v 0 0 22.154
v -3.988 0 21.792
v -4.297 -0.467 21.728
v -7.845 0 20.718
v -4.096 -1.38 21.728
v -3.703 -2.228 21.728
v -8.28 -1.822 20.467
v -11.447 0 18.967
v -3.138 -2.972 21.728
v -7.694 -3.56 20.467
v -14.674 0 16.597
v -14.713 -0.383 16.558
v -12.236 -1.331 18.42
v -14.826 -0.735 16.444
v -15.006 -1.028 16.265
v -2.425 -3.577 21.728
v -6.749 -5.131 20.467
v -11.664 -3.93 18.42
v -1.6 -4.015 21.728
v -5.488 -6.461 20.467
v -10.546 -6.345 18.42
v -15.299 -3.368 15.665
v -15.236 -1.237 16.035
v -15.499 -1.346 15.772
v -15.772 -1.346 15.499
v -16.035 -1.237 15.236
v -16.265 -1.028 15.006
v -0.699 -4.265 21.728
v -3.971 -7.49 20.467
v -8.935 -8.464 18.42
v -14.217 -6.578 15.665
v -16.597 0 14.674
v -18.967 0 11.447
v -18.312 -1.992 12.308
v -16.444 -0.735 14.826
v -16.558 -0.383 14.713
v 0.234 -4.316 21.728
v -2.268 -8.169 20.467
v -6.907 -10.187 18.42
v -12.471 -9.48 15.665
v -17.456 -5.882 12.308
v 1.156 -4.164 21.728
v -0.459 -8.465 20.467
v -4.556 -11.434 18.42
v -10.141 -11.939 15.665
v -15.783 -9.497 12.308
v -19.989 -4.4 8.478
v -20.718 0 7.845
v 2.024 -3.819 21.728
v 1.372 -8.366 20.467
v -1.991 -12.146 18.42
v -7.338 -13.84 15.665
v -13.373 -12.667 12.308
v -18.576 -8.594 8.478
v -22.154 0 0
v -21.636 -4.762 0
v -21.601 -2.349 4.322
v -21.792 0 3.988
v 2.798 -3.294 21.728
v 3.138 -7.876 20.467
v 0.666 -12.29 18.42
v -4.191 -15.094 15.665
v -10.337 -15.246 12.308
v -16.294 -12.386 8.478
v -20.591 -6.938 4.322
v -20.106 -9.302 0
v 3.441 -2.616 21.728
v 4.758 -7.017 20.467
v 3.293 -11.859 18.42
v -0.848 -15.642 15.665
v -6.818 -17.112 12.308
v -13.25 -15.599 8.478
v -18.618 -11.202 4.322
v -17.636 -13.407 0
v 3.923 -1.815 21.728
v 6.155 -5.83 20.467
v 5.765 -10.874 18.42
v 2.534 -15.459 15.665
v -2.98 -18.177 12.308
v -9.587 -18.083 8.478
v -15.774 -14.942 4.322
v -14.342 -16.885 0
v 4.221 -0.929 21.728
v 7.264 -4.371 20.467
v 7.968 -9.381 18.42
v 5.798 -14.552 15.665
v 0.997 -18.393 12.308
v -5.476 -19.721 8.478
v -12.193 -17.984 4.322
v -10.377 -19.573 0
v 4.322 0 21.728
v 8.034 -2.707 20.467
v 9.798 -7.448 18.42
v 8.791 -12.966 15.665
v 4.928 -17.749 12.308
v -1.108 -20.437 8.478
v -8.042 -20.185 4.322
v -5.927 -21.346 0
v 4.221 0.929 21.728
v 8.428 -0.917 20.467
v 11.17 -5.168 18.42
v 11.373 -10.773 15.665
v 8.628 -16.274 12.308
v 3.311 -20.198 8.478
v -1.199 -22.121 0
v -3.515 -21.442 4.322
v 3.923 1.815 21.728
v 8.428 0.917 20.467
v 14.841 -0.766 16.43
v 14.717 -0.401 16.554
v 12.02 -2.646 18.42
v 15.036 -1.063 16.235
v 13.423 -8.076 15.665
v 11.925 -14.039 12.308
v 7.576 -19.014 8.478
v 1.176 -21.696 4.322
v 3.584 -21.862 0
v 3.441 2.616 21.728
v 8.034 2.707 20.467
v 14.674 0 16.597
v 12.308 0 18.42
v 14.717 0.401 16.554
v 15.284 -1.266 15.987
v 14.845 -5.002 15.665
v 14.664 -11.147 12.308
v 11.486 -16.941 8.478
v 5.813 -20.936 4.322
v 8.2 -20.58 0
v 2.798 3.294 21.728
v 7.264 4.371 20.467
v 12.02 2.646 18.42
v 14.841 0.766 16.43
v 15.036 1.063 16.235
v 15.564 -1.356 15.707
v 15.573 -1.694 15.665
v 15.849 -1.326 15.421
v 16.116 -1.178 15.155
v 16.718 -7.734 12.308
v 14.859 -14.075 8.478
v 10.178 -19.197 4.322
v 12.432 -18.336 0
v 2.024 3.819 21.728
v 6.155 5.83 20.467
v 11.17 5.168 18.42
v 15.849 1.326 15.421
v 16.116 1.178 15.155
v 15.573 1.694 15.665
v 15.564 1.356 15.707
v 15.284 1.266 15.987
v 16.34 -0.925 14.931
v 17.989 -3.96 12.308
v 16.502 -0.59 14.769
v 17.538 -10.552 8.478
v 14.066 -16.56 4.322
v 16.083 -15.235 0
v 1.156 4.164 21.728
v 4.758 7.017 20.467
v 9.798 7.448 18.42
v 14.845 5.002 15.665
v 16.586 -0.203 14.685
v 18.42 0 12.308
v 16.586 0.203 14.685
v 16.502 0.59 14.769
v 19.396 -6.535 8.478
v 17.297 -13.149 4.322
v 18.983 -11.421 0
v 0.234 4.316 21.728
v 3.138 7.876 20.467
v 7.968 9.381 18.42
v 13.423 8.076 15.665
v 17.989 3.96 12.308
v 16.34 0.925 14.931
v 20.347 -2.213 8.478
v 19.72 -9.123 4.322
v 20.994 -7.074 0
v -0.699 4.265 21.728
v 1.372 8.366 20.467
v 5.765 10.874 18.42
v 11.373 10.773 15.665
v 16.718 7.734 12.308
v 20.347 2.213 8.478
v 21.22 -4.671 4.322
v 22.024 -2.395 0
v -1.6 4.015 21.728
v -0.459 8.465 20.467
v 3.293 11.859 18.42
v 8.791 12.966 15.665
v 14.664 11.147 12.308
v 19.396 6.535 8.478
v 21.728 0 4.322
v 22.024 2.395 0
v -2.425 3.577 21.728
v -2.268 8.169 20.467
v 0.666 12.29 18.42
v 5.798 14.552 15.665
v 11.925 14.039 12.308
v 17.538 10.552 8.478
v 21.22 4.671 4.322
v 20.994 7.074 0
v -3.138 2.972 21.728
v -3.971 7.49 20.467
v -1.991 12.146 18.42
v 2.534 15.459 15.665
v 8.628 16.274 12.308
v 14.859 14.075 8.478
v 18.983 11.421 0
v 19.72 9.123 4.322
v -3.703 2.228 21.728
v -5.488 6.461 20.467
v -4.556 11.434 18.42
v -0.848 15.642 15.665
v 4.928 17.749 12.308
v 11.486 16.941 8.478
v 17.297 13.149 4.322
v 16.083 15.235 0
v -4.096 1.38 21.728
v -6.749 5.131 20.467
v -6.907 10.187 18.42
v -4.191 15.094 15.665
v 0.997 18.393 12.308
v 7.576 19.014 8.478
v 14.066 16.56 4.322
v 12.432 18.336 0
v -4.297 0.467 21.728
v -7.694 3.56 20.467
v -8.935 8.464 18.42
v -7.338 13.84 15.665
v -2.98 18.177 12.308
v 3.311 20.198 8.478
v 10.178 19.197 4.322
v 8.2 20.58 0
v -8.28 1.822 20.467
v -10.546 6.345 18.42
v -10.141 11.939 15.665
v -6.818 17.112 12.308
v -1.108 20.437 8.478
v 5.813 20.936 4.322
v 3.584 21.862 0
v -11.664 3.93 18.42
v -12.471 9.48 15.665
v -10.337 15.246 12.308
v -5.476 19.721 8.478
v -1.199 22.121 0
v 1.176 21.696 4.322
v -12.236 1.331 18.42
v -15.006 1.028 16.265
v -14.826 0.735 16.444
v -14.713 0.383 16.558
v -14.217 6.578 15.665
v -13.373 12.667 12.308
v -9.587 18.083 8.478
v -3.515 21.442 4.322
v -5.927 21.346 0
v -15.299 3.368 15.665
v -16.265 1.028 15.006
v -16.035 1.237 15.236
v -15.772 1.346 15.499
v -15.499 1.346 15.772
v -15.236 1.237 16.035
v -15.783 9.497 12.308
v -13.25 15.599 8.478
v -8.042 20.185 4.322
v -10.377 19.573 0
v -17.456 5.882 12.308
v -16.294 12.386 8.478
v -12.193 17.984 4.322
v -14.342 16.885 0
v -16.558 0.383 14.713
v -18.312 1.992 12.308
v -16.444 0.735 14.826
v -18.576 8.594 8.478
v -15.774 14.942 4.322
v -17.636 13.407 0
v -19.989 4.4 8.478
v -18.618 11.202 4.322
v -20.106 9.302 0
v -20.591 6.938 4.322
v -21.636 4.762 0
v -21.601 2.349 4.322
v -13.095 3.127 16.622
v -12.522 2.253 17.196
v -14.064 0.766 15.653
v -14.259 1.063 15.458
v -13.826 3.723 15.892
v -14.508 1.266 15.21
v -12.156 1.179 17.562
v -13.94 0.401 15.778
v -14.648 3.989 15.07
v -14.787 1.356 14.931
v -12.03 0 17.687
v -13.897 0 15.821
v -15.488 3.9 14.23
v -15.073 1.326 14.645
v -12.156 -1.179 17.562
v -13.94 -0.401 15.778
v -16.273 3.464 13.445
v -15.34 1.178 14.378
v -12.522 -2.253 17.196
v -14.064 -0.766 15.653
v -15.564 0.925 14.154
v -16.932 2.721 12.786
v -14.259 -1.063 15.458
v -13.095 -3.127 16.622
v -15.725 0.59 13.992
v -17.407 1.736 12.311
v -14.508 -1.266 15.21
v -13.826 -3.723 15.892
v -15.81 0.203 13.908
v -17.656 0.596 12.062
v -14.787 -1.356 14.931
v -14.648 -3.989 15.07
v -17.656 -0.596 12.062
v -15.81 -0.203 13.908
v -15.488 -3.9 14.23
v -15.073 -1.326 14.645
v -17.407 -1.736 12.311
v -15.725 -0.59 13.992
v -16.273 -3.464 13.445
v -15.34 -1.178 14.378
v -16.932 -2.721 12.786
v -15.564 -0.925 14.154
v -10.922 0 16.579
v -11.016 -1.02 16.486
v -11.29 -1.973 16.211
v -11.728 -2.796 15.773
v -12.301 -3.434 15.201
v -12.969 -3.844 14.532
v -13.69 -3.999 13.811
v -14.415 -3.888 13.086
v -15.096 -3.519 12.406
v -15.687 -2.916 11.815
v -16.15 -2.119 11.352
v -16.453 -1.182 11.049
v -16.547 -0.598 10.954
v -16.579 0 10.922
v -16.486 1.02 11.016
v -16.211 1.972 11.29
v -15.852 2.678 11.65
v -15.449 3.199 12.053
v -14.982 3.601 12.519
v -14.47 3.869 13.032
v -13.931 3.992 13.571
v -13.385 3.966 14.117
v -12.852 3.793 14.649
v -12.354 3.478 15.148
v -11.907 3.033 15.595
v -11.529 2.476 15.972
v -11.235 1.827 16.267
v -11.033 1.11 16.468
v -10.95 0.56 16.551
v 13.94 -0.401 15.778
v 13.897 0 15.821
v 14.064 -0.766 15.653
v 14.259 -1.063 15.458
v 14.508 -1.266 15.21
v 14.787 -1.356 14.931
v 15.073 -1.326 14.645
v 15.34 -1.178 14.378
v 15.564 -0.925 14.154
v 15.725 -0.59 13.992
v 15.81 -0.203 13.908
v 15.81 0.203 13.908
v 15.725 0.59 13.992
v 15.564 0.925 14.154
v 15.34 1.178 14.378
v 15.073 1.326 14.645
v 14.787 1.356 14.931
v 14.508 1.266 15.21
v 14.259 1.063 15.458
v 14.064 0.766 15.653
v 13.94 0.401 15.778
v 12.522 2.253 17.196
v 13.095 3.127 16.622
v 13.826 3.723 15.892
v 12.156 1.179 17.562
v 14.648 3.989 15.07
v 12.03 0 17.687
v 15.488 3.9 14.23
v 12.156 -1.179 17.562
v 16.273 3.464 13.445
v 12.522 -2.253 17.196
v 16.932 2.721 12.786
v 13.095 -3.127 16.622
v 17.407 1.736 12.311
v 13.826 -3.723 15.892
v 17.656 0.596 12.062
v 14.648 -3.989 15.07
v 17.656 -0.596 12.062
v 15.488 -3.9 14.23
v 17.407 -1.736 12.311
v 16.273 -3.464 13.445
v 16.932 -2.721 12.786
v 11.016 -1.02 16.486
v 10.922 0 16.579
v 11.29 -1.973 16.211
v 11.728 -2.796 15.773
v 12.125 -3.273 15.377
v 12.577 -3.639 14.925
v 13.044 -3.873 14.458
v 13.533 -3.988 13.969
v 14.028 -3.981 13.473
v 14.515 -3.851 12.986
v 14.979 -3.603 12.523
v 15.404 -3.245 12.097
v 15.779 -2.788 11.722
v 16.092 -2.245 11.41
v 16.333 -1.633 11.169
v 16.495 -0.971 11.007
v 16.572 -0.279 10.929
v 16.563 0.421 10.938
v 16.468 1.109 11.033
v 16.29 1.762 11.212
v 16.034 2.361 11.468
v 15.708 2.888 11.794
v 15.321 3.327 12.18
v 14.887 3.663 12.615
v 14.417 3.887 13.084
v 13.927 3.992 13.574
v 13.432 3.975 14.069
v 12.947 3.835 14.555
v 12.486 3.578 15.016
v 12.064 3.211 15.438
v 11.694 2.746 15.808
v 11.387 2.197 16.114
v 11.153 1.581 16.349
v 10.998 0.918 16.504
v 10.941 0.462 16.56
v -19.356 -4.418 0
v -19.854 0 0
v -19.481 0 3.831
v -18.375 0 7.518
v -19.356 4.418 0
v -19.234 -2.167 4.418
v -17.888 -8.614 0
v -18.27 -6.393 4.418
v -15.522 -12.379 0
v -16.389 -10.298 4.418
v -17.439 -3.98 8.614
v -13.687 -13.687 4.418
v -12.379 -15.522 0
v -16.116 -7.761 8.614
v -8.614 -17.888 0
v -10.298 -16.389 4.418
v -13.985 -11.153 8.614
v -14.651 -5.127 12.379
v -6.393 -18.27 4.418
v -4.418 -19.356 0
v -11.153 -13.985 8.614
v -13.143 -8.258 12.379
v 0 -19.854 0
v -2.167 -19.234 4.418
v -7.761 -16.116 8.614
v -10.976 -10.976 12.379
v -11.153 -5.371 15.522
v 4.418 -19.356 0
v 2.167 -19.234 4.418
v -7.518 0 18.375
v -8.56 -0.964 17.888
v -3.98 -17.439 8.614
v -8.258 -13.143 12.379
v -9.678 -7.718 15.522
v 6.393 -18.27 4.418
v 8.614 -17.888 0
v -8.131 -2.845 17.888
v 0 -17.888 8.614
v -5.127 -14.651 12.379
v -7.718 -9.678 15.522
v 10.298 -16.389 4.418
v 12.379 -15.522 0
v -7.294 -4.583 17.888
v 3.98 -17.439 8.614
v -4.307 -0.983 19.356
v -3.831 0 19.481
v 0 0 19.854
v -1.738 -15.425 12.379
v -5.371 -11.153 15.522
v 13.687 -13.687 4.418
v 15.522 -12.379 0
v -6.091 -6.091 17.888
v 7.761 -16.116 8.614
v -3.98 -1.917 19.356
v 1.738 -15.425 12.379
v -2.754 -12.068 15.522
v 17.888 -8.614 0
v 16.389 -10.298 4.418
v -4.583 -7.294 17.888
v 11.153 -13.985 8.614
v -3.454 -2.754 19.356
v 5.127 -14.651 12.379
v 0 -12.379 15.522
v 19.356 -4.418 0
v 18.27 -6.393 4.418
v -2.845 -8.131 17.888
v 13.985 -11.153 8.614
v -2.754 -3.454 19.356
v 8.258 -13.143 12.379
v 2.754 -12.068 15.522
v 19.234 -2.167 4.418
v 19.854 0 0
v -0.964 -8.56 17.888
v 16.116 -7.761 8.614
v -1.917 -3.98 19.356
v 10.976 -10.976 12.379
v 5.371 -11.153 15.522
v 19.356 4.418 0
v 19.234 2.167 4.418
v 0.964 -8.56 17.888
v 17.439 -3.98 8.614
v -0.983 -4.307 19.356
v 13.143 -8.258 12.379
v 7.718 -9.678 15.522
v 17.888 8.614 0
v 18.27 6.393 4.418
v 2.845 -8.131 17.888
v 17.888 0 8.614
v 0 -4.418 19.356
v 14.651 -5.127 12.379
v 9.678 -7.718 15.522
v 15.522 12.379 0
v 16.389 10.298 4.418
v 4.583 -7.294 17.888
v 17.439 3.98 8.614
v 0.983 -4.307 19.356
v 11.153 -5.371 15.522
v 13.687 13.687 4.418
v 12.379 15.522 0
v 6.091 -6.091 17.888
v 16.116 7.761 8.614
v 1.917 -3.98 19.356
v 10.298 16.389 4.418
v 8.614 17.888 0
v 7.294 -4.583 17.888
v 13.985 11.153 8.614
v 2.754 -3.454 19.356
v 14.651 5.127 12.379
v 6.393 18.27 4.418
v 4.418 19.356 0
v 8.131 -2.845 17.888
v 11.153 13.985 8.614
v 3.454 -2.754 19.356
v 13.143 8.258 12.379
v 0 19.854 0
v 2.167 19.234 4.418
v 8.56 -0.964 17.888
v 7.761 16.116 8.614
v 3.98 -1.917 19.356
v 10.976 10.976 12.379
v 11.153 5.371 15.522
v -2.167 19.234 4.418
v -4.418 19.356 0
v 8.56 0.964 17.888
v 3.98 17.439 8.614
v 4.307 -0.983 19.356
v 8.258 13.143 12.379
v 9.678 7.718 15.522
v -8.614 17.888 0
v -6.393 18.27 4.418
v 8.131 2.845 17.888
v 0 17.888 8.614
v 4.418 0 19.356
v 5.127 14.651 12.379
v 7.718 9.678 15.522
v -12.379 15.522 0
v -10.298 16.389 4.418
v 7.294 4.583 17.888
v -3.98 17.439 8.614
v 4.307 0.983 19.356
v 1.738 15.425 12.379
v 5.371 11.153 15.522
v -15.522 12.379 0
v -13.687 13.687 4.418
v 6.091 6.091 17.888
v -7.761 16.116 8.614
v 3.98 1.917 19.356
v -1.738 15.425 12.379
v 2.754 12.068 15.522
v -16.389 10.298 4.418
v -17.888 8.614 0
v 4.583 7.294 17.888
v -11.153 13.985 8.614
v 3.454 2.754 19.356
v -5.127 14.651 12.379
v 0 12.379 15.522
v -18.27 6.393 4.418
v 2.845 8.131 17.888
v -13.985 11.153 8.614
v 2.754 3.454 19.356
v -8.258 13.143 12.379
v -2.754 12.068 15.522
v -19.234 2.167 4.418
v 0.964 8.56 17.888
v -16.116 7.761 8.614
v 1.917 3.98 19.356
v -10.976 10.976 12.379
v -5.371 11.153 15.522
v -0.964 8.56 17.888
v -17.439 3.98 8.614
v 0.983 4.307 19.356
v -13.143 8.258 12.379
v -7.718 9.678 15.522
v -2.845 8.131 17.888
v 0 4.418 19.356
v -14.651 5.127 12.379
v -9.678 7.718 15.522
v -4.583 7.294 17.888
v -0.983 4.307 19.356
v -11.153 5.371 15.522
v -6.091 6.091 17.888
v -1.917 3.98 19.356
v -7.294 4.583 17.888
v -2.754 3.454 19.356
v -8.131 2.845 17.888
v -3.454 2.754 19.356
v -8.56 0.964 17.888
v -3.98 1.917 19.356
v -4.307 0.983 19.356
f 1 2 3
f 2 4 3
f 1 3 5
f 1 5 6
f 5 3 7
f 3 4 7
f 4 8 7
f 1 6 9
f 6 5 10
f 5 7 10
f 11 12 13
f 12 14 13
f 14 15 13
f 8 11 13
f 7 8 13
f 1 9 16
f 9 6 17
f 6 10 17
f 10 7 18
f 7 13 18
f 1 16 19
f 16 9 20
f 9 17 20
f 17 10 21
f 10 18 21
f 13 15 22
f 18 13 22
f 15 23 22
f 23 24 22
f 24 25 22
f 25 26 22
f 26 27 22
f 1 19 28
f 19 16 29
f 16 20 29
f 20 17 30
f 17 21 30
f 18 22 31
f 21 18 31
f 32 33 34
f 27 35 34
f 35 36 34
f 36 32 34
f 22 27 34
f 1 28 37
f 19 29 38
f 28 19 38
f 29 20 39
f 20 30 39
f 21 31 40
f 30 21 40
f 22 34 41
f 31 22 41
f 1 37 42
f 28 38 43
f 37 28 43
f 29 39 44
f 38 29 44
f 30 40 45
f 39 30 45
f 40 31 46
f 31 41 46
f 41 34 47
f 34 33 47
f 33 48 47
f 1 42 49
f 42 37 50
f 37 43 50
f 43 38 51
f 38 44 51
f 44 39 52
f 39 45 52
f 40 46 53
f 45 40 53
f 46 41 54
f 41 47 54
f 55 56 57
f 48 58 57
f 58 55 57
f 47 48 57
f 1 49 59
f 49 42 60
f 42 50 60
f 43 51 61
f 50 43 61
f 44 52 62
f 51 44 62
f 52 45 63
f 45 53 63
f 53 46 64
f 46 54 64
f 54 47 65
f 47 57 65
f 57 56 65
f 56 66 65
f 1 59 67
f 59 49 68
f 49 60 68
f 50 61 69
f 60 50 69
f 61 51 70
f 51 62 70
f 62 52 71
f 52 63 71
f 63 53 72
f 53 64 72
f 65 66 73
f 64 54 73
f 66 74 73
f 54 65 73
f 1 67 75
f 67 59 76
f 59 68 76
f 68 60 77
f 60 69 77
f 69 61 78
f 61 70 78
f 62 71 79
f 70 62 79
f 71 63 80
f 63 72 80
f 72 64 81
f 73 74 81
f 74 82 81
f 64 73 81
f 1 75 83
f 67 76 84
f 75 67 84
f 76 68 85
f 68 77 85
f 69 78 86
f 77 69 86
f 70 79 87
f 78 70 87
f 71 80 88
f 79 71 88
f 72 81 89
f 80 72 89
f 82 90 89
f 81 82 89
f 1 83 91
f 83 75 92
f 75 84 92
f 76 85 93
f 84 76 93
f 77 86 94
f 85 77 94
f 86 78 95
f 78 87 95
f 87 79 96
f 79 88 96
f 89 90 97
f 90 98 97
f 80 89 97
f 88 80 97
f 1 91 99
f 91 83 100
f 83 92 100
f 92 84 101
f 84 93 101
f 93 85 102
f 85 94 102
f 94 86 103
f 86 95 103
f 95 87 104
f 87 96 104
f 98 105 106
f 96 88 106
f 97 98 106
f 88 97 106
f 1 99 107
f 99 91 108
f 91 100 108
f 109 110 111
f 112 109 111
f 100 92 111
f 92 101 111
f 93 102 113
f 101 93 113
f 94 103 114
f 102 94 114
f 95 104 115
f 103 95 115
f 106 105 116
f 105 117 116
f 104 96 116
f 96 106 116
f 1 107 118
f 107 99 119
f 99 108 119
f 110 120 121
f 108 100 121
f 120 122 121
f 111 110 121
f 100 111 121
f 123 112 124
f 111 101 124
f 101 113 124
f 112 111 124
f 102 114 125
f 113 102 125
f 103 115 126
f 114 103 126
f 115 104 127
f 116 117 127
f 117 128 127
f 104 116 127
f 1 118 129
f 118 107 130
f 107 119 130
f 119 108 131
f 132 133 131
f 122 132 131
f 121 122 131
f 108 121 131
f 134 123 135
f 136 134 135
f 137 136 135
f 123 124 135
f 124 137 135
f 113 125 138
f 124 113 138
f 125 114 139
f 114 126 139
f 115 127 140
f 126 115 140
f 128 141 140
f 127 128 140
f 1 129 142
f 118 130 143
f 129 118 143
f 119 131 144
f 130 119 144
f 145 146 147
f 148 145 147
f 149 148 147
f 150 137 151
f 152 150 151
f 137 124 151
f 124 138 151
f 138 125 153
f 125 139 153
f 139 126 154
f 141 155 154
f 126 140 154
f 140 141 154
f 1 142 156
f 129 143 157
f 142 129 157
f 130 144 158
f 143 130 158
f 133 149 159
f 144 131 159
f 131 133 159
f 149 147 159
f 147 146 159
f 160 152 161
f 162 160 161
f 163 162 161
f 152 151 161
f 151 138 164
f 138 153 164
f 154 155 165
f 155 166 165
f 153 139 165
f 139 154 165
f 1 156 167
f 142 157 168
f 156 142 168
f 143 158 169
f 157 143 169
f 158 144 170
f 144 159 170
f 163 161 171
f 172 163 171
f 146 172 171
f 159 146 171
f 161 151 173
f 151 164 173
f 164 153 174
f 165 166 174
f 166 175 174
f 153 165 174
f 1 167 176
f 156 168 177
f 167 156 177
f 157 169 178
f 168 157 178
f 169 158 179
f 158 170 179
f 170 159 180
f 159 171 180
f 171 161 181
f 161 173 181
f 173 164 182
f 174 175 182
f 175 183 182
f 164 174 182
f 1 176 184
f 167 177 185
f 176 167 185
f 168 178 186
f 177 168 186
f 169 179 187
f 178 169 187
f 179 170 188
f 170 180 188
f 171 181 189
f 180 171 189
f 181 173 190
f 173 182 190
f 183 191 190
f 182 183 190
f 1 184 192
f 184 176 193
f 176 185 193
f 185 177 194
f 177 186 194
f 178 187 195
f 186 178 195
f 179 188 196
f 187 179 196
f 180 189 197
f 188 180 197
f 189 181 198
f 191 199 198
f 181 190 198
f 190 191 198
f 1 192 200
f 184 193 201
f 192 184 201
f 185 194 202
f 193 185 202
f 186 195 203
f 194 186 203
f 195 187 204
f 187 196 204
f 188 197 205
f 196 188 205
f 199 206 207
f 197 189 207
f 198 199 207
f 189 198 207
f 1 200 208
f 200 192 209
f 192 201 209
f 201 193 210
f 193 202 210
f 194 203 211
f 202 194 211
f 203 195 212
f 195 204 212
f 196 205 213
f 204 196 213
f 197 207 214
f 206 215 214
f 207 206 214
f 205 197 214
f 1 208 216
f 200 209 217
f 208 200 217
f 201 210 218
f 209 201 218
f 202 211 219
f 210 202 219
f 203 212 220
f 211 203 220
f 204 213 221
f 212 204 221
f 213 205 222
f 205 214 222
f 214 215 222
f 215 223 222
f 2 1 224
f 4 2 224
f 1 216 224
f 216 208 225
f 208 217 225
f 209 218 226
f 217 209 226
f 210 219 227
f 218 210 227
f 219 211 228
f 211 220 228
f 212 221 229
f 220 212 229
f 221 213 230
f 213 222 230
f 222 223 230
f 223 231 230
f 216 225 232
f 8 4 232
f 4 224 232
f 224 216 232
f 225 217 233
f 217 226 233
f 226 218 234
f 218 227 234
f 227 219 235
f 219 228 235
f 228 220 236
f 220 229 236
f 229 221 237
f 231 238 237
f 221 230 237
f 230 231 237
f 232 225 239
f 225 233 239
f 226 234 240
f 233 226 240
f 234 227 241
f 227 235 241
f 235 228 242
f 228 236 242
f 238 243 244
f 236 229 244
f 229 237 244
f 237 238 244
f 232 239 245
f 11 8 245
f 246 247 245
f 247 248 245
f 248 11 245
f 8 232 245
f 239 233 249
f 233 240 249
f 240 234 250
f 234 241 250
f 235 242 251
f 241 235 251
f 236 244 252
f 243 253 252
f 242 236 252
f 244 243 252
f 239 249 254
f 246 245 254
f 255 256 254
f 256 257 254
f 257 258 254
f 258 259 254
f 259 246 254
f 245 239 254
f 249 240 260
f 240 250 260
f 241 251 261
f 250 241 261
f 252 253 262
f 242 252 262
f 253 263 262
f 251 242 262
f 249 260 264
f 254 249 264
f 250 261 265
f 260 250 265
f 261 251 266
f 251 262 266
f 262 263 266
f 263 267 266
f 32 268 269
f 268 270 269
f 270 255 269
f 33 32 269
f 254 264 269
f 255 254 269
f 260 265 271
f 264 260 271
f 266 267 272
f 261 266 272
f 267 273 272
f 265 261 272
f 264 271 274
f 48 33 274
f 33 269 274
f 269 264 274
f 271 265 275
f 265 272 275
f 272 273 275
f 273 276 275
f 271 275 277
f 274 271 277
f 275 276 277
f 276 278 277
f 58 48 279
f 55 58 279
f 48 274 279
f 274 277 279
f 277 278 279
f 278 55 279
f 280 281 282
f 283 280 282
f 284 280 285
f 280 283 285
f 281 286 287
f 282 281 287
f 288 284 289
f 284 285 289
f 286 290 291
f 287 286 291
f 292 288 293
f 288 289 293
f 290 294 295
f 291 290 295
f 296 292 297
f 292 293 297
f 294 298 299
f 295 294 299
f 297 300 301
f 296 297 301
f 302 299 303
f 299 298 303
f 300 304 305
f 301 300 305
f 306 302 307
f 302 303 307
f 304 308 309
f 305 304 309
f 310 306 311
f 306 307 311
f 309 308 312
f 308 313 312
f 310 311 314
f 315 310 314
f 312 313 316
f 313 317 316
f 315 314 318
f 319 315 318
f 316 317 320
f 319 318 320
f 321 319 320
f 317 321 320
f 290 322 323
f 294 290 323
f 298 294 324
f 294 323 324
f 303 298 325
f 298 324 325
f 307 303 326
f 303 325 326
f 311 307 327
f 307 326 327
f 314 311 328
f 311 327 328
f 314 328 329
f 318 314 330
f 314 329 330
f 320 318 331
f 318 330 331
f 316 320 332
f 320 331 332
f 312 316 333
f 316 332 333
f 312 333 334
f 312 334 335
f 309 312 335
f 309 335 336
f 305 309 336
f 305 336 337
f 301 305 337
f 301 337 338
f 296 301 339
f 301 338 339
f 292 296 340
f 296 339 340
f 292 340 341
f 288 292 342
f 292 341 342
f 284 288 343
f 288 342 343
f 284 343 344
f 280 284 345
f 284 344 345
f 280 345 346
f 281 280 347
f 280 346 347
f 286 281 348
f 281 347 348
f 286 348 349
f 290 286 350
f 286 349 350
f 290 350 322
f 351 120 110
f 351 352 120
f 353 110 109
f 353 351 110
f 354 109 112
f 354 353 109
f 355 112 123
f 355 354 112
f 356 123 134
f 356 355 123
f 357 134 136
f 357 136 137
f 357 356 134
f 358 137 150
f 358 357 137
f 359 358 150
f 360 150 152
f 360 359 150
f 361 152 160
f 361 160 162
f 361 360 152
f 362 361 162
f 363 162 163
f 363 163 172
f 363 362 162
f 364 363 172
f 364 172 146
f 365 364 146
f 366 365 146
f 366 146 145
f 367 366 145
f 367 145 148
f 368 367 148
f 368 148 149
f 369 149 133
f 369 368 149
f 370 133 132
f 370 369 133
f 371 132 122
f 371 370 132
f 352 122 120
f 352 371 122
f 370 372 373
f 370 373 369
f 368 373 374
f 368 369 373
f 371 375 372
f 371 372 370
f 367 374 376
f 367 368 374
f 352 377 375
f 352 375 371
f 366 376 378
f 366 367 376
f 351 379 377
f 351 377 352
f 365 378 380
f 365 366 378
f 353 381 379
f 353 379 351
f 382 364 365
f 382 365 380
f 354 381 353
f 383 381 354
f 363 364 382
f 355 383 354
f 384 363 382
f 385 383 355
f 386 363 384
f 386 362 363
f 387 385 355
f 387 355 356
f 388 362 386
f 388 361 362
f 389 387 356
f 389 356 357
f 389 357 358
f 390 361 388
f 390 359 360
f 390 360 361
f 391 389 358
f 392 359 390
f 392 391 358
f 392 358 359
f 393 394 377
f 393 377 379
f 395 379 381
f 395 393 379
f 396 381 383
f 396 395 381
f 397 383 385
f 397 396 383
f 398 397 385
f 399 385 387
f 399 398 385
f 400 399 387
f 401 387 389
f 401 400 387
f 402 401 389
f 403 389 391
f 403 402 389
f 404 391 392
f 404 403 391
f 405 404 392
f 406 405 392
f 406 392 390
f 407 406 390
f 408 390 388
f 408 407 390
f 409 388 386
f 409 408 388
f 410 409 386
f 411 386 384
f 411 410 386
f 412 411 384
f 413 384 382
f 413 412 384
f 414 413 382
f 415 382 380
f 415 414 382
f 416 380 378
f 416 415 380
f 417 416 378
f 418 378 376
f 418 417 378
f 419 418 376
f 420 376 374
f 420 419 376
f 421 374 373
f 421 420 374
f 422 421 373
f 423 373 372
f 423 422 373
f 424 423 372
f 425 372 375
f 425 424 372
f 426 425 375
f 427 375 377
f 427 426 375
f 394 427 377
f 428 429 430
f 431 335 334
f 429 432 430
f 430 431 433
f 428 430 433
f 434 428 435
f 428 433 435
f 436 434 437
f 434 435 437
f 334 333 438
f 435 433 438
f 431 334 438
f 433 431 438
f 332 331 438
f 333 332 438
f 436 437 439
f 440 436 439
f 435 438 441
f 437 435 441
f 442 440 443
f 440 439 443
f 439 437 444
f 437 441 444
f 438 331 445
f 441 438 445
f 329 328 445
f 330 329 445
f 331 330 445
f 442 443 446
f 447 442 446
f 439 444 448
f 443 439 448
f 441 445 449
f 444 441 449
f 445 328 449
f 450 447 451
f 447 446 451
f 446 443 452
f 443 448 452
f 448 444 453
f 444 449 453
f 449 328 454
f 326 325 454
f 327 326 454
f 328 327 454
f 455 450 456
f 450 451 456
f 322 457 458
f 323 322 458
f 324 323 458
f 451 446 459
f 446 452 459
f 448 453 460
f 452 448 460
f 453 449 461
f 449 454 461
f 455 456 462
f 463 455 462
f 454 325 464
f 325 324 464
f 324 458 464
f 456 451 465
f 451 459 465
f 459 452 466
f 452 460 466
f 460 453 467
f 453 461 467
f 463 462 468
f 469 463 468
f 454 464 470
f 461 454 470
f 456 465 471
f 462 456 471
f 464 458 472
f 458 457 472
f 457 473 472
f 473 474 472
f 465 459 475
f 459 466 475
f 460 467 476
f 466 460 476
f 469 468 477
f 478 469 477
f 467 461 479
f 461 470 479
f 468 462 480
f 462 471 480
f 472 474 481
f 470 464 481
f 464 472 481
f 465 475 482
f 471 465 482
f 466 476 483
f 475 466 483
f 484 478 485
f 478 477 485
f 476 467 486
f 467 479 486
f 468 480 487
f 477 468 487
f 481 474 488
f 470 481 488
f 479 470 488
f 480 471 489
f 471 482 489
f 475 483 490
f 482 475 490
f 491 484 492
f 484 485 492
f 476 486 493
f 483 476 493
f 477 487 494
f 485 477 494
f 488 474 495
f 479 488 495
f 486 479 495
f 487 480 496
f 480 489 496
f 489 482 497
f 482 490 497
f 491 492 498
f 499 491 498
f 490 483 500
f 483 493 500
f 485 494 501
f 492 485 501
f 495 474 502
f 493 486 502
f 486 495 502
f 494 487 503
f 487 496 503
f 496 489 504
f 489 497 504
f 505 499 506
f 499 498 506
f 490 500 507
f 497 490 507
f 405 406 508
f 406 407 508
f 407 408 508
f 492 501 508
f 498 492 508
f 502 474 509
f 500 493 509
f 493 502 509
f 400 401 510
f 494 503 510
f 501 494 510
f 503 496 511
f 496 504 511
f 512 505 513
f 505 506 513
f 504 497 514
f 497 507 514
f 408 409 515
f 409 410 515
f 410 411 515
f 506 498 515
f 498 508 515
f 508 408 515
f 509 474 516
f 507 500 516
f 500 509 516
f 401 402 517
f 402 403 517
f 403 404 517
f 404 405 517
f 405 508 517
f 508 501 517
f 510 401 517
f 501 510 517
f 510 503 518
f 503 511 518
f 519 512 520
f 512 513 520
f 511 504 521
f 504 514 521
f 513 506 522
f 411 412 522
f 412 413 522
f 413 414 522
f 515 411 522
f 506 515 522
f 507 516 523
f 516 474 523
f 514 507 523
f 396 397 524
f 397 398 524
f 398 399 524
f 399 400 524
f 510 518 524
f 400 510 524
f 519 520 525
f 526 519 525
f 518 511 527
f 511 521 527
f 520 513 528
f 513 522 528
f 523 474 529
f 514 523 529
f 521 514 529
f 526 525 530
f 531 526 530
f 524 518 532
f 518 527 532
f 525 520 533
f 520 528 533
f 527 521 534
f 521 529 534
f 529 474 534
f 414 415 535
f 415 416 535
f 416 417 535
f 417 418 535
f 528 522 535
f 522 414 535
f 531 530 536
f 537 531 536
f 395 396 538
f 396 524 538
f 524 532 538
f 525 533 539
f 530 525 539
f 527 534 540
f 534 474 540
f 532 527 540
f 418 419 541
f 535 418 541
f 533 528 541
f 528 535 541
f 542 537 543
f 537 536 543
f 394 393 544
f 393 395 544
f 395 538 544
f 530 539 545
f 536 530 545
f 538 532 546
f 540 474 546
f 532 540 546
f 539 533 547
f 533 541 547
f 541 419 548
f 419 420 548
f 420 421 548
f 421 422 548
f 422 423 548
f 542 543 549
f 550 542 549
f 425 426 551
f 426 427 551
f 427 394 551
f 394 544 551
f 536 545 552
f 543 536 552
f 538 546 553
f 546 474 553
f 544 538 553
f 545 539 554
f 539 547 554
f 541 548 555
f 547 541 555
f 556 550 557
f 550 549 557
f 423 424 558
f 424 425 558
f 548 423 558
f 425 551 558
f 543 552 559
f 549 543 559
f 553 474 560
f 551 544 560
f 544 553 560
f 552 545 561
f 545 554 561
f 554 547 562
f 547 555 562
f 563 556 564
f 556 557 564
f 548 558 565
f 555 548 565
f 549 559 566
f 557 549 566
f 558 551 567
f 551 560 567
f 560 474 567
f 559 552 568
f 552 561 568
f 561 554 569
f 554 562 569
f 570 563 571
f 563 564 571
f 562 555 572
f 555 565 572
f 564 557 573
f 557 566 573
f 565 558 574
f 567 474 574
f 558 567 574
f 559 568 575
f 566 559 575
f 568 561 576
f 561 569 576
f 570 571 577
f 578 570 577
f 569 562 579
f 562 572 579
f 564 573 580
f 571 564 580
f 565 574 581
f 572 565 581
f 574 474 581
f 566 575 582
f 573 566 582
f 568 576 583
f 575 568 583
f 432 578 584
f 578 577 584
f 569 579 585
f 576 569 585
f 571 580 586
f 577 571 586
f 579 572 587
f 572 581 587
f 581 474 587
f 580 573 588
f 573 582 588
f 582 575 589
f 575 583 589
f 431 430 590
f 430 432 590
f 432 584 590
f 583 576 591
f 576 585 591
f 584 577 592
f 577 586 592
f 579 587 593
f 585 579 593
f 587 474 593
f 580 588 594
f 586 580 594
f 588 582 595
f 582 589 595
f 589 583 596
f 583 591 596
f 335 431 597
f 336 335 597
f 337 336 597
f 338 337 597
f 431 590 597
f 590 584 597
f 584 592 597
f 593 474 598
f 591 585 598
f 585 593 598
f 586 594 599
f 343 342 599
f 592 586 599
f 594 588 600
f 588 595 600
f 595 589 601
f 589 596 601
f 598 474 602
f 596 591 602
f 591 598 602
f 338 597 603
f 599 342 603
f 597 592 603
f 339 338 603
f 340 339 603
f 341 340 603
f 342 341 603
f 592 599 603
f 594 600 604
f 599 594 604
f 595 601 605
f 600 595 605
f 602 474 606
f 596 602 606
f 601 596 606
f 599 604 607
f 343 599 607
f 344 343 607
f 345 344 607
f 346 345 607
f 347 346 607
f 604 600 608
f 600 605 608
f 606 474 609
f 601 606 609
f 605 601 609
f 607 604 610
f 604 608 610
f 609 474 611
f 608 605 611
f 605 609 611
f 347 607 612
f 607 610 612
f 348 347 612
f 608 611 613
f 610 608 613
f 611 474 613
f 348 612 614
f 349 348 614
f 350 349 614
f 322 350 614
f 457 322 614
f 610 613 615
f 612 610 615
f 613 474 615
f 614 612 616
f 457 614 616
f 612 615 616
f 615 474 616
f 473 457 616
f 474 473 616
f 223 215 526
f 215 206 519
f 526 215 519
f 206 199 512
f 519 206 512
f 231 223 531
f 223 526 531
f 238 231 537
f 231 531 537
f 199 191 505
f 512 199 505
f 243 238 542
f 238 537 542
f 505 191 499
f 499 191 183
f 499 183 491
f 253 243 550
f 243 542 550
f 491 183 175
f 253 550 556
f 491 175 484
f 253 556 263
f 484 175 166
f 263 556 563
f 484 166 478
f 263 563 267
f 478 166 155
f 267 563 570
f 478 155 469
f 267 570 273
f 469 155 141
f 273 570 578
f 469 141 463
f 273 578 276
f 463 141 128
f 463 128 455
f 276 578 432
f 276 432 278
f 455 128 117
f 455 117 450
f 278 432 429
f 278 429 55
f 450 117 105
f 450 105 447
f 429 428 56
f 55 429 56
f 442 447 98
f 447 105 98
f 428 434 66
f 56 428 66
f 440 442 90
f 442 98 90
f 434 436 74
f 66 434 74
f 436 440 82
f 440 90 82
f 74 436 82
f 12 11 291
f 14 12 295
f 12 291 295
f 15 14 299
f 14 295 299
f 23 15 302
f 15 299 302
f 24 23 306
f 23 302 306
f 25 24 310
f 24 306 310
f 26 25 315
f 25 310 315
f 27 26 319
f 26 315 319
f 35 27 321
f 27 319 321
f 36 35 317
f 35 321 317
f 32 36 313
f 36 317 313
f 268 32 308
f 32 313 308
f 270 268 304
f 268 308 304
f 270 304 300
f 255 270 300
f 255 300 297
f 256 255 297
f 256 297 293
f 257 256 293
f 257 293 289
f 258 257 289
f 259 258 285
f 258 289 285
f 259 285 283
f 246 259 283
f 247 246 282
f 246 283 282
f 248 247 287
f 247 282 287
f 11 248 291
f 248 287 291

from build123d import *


with BuildPart() as f1:
    # F0 (on Front) → F1 (revolve)
    with BuildSketch(Plane.XZ):
        with BuildLine():
            Line((0, 19.8536554546), (0, 22.1536554546))
            ThreePointArc((0, 22.1536554546), (-15.665, 15.665), (-22.1536554546, 0))
            Line((-22.1536554546, 0), (-19.8536554546, 0))
            ThreePointArc((-19.8536554546, 0), (-14.0386544033, 14.0386544033), (0, 19.8536554546))
        make_face()
    revolve(axis=Axis((0, 0, 21.0036554546), (0, 0, 1)))

    # F3: F2 across plane


with BuildPart() as f2:
    # F0 (on Front) → F2 (revolve)
    with BuildSketch(Plane.XZ):
        with BuildLine():
            ThreePointArc((14.0386544033, 14.0386544033), (12.5449793362, 15.3880189876), (10.9223480336, 16.5792022831))
            Line((10.9223480336, 16.5792022831), (8.4949372388, 14.1517914883))
            Line((8.4949372388, 14.1517914883), (11.3233643635, 11.3233643635))
            Line((11.3233643635, 11.3233643635), (14.0386544033, 14.0386544033))
        make_face()
        with BuildLine():
            ThreePointArc((15.665, 15.665), (15.176552286, 16.1386712808), (14.6737888804, 16.5971193252))
            Line((14.6737888804, 16.5971193252), (13.897233047, 15.8205634919))
            Line((13.897233047, 15.8205634919), (12.0304711447, 17.6873253942))
            Line((12.0304711447, 17.6873253942), (10.9223480336, 16.5792022831))
            ThreePointArc((10.9223480336, 16.5792022831), (12.5449793362, 15.3880189876), (14.0386544033, 14.0386544033))
            Line((14.0386544033, 14.0386544033), (15.665, 15.665))
        make_face()
    revolve(axis=Axis((7.8325, 0, 7.8325), (0.7071067812, 0, 0.7071067812)))


with BuildPart() as f1_1:
    add(f1.part)
    add(f2.part.mirror(Plane.YZ), mode=Mode.SUBTRACT)

    # F4: cut F2
    add(f2.part, mode=Mode.SUBTRACT)


solid = f1_1.part
